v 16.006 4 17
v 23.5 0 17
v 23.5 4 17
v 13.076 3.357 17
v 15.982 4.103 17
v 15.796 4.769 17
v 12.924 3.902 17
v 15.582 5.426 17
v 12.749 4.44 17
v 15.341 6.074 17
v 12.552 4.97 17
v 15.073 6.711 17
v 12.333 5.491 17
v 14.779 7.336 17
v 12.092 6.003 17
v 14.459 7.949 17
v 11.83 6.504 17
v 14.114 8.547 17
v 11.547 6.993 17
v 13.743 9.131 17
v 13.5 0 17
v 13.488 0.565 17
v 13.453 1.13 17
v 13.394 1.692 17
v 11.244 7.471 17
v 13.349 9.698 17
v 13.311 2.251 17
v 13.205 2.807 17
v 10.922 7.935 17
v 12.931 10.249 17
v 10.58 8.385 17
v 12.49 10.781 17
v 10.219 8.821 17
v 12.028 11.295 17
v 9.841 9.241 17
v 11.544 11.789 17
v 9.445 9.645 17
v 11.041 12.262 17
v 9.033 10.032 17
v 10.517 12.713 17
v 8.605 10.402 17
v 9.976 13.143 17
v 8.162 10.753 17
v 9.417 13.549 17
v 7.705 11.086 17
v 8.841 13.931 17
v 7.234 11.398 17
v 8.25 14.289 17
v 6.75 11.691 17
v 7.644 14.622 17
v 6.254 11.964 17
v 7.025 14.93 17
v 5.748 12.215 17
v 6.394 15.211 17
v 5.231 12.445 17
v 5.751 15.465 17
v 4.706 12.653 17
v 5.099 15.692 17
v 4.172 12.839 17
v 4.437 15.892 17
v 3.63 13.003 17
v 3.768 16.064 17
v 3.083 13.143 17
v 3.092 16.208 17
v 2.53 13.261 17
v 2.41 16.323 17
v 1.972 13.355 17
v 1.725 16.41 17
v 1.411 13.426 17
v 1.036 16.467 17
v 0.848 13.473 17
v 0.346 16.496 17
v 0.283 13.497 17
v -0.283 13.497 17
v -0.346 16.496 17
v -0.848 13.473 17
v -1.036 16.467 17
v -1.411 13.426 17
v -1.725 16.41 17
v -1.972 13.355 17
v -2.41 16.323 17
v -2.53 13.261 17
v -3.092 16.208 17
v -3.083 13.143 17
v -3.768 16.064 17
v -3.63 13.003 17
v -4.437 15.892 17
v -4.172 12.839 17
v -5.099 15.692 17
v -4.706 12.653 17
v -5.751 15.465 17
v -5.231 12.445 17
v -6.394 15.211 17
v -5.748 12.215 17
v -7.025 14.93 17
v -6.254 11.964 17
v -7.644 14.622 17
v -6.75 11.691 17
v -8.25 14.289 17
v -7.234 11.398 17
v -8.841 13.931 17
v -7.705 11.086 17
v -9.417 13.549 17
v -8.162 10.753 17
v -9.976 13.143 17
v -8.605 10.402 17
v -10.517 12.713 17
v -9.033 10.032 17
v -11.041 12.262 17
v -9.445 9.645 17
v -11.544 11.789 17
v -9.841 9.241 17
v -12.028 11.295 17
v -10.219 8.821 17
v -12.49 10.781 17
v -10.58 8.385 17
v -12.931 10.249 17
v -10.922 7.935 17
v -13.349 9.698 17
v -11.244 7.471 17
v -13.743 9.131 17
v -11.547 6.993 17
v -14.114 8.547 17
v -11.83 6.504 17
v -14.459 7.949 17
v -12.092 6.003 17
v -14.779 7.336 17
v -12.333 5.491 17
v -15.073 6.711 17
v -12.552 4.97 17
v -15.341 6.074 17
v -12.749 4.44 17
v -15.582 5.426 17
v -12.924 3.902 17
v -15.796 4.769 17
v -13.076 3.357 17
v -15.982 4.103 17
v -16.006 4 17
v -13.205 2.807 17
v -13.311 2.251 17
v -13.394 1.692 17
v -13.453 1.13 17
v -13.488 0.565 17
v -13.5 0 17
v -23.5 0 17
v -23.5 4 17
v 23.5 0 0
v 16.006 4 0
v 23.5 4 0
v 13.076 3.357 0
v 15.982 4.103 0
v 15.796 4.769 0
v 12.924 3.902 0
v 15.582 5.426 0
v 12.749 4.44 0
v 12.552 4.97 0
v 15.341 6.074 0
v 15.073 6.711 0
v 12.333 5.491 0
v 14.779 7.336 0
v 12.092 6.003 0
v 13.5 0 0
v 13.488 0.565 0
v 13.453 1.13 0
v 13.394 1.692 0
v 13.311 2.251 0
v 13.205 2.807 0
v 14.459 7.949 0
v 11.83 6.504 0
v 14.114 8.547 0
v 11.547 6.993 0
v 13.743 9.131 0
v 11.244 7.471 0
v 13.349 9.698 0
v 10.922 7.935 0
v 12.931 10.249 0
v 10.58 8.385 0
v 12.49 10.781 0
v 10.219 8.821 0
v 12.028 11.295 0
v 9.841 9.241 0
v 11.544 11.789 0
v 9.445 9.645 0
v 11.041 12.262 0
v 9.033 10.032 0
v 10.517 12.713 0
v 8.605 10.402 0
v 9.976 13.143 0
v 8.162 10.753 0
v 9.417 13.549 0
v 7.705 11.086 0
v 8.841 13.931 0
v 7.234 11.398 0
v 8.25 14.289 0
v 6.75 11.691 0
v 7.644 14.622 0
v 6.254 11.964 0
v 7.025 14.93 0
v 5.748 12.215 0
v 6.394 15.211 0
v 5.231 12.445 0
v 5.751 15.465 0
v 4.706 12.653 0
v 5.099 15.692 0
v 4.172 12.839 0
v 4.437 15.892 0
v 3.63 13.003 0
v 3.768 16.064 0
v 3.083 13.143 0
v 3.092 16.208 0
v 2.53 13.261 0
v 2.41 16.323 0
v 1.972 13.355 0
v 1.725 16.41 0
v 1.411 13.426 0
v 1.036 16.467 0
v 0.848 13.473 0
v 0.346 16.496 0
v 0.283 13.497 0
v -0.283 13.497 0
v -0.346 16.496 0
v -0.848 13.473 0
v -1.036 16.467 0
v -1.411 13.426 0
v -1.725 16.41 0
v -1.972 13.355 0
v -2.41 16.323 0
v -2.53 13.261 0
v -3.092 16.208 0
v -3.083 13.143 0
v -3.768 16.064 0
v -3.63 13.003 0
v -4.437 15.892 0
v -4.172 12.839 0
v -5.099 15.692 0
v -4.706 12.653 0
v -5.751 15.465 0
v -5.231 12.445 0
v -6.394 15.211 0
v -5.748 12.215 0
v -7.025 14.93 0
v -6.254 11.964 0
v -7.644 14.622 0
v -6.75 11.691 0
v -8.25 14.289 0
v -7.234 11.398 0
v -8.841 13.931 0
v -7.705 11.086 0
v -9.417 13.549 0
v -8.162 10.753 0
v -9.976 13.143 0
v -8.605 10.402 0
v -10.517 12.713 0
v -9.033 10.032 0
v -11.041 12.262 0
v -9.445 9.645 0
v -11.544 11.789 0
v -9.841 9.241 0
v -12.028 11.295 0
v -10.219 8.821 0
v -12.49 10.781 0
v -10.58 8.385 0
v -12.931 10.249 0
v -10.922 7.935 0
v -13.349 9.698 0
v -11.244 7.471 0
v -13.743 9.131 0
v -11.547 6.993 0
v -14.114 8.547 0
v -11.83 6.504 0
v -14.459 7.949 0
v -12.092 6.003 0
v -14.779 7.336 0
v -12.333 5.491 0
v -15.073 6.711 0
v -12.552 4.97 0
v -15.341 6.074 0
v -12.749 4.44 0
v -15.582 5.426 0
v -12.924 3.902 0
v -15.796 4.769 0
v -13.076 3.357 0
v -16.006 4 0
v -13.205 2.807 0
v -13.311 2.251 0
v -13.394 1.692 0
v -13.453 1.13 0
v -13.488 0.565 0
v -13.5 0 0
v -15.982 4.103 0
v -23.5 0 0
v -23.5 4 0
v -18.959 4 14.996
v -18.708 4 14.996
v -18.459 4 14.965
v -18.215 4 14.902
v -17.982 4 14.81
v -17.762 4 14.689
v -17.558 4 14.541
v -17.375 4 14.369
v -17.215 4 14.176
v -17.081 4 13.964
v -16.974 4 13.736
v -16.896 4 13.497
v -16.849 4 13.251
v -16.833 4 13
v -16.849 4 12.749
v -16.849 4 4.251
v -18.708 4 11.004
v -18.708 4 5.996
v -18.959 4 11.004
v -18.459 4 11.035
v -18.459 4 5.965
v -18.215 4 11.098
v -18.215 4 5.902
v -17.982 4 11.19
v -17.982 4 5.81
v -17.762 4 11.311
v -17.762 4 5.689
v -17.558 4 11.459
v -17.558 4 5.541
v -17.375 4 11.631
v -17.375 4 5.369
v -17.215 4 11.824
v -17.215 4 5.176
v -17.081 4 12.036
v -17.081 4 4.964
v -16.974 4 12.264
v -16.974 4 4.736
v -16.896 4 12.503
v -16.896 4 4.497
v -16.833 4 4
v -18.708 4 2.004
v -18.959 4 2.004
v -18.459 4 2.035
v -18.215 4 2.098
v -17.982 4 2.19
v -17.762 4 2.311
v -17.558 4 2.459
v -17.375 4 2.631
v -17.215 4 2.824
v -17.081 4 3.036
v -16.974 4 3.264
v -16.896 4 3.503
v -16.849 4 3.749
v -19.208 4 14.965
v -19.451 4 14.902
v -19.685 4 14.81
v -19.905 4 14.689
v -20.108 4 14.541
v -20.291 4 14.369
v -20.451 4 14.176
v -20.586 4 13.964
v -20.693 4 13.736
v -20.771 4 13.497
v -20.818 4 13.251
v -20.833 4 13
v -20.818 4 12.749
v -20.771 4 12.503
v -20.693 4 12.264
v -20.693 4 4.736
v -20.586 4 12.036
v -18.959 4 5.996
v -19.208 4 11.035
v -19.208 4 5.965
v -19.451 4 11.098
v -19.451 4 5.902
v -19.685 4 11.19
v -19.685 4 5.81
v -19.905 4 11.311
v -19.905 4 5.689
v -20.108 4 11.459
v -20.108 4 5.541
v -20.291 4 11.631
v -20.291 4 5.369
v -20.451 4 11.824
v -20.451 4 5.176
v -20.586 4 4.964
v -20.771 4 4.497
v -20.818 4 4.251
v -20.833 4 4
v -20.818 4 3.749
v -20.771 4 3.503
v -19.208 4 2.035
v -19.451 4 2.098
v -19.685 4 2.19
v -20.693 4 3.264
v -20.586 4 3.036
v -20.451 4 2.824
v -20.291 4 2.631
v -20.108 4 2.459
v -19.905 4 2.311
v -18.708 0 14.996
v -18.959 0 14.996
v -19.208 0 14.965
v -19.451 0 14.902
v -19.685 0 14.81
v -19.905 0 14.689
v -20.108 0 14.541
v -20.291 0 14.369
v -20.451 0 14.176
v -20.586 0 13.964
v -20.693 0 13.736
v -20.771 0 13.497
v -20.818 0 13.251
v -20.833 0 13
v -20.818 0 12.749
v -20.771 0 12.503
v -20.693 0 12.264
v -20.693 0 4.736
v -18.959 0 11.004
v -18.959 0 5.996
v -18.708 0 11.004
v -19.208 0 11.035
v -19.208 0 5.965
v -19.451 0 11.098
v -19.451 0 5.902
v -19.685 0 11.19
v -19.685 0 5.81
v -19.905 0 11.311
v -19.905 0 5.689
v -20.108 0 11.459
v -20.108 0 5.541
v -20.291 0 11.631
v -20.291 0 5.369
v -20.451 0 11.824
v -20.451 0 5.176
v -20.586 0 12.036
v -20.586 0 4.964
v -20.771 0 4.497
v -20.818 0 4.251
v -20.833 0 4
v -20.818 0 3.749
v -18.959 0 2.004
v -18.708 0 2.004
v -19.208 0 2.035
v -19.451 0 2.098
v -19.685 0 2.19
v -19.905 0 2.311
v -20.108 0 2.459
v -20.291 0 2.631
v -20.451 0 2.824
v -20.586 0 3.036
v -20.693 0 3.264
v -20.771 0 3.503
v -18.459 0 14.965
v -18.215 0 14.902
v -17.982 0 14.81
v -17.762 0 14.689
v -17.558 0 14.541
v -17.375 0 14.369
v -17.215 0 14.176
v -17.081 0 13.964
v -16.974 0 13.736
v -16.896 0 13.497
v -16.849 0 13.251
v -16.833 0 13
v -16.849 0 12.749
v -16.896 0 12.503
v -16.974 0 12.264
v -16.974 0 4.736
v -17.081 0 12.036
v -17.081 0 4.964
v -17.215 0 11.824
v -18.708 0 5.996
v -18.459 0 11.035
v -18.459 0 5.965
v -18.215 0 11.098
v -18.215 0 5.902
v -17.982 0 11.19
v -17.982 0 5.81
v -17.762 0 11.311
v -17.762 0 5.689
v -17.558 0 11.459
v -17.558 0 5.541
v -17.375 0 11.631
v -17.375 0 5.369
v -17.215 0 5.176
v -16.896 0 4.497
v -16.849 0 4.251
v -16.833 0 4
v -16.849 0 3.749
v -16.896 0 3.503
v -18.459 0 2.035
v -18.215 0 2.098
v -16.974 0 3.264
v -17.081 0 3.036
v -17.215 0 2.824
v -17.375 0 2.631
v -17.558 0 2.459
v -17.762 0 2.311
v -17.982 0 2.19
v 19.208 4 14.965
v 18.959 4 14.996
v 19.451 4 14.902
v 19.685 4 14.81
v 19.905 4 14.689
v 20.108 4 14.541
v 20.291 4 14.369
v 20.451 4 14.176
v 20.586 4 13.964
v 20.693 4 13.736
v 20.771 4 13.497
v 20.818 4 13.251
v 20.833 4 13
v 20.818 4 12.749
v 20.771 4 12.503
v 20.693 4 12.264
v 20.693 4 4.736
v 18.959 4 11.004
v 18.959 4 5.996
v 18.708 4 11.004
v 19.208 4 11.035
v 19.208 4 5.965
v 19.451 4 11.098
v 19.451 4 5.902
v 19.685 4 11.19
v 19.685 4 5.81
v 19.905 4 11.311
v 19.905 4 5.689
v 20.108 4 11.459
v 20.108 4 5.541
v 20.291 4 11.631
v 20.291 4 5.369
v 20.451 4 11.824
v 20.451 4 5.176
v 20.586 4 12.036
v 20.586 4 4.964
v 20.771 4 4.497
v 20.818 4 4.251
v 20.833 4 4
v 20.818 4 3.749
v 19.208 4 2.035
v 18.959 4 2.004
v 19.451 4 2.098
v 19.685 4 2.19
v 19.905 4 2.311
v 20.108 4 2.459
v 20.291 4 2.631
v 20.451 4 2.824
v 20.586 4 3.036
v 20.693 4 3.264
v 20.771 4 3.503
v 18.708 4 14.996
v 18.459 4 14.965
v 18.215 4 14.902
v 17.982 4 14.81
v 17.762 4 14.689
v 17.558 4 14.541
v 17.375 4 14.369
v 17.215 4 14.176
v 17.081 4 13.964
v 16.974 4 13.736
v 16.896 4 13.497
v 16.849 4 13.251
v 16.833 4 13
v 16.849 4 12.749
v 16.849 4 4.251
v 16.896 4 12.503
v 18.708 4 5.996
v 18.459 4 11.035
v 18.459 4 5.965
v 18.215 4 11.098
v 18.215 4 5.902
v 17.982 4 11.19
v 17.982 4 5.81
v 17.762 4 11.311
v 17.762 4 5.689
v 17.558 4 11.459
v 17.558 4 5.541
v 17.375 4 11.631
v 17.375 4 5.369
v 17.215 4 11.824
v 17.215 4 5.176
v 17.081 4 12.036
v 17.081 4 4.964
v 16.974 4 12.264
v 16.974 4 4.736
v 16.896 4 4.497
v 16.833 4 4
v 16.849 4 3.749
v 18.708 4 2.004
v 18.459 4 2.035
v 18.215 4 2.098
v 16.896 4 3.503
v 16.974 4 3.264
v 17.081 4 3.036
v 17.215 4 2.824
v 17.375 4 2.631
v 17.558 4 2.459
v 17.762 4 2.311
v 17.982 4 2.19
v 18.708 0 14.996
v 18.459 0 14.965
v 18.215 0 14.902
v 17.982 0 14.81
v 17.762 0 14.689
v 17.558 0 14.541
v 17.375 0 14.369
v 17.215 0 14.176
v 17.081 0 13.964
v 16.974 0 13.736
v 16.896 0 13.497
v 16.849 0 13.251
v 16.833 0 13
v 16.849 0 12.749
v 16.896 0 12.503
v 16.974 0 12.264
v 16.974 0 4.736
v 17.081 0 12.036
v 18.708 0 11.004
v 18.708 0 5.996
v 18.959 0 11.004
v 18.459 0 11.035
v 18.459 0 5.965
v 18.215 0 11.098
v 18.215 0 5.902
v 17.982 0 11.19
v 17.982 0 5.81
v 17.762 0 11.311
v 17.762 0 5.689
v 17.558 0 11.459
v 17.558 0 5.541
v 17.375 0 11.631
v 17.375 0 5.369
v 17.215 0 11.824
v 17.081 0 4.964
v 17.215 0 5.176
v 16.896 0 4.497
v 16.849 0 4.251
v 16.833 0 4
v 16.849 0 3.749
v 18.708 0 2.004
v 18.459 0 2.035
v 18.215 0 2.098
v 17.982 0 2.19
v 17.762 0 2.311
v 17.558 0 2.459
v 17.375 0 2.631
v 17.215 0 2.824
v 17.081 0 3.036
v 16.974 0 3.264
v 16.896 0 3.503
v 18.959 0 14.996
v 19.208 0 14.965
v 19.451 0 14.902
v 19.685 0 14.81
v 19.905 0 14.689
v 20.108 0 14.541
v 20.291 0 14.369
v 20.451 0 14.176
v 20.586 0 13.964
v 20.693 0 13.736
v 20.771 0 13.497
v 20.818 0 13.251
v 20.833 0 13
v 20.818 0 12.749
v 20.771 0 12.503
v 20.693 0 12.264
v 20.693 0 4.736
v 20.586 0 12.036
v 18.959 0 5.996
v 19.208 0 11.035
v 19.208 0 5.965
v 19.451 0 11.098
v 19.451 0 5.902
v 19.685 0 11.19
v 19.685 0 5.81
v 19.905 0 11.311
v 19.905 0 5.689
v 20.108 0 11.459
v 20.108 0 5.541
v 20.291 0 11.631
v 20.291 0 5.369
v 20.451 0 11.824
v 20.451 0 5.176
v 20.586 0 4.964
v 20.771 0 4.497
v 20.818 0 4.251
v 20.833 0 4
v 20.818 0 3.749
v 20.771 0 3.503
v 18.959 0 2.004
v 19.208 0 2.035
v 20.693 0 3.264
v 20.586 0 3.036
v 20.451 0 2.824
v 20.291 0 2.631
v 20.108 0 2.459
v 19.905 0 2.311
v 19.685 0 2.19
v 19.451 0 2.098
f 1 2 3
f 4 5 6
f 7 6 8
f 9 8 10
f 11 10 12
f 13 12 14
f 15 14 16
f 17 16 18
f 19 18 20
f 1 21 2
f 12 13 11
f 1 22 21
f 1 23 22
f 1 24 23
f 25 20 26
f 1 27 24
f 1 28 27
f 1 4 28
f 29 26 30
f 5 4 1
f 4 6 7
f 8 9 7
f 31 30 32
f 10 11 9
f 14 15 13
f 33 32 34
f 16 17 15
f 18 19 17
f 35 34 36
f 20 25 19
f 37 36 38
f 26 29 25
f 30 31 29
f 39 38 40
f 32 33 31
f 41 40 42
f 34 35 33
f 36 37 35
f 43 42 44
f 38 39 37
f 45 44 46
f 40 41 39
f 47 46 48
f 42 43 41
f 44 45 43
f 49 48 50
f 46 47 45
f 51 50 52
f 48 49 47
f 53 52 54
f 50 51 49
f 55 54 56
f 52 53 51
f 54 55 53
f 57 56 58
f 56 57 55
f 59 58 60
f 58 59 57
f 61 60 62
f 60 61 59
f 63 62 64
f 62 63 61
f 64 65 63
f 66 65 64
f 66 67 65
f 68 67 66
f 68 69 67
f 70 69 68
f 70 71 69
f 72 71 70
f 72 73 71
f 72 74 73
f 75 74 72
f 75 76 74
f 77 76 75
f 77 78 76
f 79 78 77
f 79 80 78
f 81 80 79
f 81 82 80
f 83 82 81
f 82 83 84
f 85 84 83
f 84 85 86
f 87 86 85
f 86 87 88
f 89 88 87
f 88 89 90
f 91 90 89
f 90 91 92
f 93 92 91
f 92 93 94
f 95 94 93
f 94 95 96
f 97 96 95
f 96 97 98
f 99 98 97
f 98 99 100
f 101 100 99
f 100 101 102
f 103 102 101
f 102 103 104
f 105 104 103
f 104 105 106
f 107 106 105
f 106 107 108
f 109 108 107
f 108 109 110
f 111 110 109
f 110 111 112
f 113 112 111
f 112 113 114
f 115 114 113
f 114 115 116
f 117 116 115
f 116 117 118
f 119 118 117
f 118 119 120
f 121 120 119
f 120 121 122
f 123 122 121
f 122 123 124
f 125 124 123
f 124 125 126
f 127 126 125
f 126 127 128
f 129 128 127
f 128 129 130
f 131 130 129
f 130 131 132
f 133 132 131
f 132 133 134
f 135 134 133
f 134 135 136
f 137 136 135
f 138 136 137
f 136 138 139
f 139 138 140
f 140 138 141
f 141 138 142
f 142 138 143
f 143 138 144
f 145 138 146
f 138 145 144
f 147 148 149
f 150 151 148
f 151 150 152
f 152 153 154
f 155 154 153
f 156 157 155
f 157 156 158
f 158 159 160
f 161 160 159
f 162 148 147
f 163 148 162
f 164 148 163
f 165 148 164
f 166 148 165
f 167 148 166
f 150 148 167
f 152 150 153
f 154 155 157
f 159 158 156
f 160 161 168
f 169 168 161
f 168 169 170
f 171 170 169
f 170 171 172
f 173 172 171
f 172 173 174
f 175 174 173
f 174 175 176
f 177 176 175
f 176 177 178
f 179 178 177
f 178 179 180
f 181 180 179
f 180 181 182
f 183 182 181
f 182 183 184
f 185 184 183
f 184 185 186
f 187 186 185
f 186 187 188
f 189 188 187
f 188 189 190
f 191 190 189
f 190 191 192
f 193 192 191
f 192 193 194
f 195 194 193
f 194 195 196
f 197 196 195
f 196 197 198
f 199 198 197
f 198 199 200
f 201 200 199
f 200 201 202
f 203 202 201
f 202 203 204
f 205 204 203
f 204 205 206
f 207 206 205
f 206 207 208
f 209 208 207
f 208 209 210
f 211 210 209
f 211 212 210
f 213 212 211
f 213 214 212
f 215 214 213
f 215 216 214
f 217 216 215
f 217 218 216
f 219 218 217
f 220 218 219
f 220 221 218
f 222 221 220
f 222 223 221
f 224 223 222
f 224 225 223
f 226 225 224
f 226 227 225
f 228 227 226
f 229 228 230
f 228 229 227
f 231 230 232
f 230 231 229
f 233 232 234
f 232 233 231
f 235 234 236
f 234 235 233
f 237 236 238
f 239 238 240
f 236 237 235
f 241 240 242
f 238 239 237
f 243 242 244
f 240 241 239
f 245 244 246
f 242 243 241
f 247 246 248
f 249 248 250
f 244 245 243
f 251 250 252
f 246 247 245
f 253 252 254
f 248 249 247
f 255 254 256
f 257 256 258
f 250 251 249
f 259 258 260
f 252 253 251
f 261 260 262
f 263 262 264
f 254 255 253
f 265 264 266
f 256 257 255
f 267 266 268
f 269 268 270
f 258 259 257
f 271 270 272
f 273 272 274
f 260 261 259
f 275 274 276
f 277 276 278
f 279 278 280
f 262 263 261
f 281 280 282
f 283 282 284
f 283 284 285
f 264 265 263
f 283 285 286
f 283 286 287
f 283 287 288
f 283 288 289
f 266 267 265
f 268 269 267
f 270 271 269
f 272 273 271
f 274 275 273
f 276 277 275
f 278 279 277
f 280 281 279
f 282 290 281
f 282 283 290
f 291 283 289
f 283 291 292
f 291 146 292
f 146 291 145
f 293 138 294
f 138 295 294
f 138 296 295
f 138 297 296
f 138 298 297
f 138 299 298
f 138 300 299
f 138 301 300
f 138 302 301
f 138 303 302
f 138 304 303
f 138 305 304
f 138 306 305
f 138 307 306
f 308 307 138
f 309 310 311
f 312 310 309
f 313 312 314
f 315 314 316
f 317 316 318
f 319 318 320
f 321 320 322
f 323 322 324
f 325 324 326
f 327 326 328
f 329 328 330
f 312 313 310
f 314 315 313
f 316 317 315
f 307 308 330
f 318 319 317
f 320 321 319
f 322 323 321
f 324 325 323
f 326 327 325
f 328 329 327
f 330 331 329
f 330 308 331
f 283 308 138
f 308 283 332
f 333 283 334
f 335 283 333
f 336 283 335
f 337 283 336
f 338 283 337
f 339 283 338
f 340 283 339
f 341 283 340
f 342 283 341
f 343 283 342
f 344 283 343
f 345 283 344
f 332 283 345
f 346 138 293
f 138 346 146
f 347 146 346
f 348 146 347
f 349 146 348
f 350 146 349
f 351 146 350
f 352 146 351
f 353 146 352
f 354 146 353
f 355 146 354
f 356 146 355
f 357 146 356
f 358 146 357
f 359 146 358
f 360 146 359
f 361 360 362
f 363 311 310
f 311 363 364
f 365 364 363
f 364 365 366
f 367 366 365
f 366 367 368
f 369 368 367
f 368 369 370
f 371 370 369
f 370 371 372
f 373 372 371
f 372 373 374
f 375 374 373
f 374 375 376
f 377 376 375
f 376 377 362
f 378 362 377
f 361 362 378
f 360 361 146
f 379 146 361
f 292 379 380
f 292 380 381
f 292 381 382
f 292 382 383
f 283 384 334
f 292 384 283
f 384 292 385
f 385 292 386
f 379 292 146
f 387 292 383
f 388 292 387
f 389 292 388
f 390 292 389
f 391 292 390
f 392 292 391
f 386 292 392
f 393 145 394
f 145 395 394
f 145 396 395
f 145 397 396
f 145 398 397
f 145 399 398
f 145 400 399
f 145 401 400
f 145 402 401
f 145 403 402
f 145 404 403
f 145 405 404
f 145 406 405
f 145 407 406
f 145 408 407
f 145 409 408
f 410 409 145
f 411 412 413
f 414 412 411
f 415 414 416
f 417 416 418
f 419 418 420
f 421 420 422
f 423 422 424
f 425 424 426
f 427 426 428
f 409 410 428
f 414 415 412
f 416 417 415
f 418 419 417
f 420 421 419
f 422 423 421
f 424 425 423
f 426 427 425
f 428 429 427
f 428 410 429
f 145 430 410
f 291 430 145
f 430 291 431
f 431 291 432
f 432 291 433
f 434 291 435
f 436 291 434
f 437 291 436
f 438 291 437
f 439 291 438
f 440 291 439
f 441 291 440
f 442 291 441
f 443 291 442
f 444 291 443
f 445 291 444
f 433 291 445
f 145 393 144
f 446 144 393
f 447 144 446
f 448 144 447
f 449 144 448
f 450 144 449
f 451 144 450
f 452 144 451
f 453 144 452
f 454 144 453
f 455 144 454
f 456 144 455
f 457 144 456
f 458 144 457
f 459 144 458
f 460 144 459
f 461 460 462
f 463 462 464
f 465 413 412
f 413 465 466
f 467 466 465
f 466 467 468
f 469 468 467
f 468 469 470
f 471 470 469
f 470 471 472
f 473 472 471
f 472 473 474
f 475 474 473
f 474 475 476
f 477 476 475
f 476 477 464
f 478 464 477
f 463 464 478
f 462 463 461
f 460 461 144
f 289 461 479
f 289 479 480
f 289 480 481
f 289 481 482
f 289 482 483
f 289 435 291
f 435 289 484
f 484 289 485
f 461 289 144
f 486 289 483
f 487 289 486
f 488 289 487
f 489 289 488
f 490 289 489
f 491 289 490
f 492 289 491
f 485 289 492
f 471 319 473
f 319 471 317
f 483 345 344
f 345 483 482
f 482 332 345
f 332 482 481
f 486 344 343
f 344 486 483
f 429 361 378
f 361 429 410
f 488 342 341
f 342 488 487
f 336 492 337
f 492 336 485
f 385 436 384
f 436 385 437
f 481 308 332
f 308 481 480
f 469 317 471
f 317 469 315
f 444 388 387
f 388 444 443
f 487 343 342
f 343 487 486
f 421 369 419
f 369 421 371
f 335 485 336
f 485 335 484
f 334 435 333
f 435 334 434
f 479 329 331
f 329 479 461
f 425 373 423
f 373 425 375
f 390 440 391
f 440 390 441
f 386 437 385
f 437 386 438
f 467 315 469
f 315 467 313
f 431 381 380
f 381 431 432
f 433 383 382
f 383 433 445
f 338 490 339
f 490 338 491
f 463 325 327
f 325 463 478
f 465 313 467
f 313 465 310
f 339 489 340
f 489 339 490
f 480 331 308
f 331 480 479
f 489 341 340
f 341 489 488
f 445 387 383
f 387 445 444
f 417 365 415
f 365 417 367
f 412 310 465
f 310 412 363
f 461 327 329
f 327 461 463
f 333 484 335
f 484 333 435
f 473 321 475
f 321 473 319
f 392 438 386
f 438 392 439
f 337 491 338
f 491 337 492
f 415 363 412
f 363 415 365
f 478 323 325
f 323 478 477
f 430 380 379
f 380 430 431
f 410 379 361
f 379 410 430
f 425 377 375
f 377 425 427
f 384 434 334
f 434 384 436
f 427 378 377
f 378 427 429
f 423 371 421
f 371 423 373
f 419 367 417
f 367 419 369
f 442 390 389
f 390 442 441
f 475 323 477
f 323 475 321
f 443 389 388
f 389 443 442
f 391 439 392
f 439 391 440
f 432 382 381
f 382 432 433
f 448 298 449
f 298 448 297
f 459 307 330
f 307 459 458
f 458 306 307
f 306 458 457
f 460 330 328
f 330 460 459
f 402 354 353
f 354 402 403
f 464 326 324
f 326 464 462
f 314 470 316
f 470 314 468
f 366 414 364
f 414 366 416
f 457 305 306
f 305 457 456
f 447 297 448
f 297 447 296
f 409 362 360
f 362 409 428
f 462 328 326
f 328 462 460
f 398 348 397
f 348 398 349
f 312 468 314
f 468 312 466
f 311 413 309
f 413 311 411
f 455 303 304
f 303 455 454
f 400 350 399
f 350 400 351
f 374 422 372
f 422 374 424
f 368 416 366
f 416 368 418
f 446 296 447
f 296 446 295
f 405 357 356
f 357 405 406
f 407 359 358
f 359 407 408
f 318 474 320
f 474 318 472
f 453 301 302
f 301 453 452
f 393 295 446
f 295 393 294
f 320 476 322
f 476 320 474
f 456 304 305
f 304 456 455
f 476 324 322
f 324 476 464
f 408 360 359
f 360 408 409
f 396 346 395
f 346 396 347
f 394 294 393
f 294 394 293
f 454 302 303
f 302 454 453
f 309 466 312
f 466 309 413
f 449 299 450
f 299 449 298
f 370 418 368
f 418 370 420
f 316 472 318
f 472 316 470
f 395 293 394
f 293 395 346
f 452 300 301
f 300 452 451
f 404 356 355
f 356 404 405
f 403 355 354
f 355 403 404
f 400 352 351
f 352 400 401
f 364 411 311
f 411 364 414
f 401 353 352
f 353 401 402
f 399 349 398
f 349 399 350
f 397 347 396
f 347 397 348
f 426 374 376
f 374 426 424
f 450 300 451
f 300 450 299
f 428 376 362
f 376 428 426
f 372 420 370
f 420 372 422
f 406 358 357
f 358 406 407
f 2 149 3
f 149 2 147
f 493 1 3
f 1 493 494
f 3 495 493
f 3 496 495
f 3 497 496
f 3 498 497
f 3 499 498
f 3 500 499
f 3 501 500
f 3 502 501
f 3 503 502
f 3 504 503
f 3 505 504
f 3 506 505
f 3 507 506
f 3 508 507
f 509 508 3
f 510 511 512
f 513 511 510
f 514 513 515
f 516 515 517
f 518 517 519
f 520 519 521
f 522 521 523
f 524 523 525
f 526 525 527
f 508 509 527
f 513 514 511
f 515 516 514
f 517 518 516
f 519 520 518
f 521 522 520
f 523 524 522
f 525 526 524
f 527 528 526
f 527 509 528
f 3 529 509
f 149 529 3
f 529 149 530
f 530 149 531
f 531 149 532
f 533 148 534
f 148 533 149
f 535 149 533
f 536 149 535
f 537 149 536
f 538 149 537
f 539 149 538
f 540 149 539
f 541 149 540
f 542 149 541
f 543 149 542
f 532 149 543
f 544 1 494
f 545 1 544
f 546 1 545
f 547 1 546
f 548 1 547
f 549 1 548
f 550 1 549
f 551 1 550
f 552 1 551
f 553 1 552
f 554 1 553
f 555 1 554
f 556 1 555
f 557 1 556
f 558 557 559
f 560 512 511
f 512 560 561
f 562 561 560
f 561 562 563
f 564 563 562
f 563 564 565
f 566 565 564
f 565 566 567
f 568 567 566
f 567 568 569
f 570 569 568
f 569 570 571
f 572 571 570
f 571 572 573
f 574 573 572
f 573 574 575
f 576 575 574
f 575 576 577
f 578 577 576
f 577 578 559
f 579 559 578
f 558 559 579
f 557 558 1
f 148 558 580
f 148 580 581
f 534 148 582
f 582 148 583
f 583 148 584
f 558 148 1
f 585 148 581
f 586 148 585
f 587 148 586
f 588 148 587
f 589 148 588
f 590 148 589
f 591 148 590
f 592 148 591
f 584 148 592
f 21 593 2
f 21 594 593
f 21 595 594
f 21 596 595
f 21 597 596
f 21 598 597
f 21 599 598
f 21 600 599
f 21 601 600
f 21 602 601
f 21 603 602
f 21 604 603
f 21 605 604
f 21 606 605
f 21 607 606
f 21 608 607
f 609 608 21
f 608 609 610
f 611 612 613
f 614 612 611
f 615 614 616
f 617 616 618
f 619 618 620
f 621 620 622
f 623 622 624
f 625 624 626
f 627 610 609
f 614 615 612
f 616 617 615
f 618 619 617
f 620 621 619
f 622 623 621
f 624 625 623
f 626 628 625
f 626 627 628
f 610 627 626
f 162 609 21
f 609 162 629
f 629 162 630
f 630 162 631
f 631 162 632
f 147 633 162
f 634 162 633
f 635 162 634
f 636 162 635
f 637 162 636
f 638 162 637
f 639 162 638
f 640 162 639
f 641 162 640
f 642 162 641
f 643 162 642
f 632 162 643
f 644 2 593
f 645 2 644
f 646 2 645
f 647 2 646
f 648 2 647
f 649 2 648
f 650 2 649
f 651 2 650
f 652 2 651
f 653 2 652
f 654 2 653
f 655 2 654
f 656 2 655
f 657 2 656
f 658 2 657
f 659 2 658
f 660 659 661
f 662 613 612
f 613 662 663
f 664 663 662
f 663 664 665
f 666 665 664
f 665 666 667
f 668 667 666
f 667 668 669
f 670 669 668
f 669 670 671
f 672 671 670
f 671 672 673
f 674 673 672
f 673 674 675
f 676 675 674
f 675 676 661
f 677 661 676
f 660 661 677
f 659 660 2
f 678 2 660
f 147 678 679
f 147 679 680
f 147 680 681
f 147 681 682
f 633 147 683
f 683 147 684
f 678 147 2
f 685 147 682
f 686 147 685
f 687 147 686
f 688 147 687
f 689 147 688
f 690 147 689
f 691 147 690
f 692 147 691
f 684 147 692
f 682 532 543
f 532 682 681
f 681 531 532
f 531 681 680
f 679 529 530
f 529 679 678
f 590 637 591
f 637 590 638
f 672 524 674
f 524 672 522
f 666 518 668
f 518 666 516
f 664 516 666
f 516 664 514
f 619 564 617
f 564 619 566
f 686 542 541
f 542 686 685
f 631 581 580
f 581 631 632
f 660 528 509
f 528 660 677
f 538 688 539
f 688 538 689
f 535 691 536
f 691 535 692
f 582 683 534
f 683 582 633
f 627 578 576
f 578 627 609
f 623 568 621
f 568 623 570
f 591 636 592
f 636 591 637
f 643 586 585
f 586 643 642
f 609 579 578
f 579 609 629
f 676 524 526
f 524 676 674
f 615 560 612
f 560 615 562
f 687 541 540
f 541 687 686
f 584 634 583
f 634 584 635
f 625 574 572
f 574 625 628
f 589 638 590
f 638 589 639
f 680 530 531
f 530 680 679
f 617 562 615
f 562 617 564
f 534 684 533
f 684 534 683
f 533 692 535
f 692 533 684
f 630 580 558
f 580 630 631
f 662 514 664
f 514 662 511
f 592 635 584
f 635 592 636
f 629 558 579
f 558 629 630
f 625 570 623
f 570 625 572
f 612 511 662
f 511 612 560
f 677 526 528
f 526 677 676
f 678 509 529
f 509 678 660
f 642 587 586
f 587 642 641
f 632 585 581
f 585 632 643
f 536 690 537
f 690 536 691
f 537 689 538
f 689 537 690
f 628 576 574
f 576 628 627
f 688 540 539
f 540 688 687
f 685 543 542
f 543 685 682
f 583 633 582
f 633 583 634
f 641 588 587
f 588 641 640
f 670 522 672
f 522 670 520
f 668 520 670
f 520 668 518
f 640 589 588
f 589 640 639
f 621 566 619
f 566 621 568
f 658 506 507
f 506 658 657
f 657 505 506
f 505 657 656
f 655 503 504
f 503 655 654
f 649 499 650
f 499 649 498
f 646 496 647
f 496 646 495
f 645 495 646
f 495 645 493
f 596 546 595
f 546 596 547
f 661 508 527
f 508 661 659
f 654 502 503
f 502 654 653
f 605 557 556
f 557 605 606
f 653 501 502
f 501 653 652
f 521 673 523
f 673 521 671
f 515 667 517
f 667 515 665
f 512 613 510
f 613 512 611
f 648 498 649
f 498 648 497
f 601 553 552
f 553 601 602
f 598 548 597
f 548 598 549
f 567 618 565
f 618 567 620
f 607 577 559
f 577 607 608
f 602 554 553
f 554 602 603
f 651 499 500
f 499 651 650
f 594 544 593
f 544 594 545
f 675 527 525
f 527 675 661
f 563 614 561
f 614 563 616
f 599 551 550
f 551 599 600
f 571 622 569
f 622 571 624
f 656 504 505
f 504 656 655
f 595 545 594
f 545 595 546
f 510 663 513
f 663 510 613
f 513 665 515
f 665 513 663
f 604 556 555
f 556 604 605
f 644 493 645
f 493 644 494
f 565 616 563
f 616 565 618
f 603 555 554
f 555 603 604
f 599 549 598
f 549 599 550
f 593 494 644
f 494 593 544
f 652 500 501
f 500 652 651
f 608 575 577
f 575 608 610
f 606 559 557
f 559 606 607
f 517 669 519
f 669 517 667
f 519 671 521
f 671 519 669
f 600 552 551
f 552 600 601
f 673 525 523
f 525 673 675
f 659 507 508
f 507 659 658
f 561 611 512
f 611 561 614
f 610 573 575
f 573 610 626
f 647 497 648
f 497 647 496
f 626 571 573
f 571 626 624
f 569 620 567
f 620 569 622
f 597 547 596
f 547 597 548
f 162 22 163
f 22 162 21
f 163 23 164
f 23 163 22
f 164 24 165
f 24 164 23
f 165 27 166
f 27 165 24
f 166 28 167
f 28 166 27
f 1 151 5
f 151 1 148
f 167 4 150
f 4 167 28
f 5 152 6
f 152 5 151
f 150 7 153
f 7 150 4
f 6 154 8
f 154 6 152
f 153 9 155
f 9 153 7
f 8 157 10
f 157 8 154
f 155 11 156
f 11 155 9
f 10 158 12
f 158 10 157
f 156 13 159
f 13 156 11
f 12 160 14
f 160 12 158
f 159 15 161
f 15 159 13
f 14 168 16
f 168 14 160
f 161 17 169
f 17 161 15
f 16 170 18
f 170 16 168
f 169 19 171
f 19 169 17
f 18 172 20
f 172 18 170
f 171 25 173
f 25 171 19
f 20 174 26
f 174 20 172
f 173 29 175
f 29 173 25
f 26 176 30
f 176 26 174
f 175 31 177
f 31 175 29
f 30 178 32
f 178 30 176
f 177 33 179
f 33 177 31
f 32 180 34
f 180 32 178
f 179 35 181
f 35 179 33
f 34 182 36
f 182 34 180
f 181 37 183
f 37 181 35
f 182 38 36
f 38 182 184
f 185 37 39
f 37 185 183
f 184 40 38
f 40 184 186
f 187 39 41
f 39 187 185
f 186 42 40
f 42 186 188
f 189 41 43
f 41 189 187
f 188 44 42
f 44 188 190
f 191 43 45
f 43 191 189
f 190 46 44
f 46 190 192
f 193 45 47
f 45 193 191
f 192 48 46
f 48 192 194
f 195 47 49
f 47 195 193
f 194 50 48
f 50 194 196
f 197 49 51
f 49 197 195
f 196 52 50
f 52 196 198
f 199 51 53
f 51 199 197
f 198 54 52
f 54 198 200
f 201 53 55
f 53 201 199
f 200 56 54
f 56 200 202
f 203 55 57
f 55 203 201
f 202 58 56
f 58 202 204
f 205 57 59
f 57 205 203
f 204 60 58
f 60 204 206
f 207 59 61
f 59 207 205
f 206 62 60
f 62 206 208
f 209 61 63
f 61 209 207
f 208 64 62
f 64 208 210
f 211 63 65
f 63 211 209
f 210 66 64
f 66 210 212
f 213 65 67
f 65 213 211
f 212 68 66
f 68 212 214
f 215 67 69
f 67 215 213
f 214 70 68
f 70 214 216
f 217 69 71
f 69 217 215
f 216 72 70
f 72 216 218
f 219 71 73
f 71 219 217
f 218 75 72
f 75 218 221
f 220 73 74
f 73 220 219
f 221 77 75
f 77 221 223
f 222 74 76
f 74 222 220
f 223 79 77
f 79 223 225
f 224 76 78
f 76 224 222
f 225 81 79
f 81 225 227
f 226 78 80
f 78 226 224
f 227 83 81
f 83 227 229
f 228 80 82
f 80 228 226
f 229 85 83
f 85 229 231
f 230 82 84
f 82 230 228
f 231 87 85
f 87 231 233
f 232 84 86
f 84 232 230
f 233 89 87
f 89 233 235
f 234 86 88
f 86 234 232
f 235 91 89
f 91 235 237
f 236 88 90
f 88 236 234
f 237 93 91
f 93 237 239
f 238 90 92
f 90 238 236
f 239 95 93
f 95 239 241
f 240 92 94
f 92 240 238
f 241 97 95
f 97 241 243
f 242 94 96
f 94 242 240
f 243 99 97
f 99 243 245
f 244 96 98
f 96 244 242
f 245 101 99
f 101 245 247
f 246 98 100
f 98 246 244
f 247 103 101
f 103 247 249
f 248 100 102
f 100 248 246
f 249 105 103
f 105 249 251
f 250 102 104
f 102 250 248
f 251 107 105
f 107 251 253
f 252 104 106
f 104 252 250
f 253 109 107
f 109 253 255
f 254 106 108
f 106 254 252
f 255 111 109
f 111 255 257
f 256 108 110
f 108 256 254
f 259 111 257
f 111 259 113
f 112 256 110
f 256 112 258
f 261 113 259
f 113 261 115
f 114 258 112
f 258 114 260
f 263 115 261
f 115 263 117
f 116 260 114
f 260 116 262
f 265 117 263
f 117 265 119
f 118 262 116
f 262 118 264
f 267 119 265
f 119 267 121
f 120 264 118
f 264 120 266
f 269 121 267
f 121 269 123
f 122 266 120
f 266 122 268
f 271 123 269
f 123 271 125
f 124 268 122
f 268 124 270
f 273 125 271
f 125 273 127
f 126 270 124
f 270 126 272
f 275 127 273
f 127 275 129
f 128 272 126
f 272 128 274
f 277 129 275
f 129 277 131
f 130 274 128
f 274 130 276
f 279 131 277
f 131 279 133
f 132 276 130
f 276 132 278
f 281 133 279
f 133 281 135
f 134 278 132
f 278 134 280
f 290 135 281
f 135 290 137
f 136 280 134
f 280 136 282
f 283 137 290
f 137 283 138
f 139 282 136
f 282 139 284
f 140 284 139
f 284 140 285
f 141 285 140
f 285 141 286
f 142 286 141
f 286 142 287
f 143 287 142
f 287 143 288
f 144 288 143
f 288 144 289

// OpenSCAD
// translate([0,10,0])

height = 17;
radius = 13.5;

rotate_extrude(angle = 180, $fn = 150) translate([ radius, 0, 0 ])
    square(size = [ 3, height ]);

difference()
{
    translate([ -10 - radius, 0, 0 ]) cube([ 10, 4, height ]);
    translate([ -radius - 5 - 1 / 3, 0, 4 ]) rotate([ 270, 0, 0 ])
        cylinder(r = 2, h = 4, $fn = 50);
    translate([ -radius - 5 - 1 / 3, 0, 13 ]) rotate([ 270, 0, 0 ])
        cylinder(r = 2, h = 4, $fn = 50);
}

difference()
{
    translate([ radius, 0, 0 ]) cube([ 10, 4, height ]);
    translate([ radius + 5 + 1 / 3, 0, 4 ]) rotate([ 270, 0, 0 ])
        cylinder(r = 2, h = 4, $fn = 50);
    translate([ radius + 5 + 1 / 3, 0, 13 ]) rotate([ 270, 0, 0 ])
        cylinder(r = 2, h = 4, $fn = 50);
};
